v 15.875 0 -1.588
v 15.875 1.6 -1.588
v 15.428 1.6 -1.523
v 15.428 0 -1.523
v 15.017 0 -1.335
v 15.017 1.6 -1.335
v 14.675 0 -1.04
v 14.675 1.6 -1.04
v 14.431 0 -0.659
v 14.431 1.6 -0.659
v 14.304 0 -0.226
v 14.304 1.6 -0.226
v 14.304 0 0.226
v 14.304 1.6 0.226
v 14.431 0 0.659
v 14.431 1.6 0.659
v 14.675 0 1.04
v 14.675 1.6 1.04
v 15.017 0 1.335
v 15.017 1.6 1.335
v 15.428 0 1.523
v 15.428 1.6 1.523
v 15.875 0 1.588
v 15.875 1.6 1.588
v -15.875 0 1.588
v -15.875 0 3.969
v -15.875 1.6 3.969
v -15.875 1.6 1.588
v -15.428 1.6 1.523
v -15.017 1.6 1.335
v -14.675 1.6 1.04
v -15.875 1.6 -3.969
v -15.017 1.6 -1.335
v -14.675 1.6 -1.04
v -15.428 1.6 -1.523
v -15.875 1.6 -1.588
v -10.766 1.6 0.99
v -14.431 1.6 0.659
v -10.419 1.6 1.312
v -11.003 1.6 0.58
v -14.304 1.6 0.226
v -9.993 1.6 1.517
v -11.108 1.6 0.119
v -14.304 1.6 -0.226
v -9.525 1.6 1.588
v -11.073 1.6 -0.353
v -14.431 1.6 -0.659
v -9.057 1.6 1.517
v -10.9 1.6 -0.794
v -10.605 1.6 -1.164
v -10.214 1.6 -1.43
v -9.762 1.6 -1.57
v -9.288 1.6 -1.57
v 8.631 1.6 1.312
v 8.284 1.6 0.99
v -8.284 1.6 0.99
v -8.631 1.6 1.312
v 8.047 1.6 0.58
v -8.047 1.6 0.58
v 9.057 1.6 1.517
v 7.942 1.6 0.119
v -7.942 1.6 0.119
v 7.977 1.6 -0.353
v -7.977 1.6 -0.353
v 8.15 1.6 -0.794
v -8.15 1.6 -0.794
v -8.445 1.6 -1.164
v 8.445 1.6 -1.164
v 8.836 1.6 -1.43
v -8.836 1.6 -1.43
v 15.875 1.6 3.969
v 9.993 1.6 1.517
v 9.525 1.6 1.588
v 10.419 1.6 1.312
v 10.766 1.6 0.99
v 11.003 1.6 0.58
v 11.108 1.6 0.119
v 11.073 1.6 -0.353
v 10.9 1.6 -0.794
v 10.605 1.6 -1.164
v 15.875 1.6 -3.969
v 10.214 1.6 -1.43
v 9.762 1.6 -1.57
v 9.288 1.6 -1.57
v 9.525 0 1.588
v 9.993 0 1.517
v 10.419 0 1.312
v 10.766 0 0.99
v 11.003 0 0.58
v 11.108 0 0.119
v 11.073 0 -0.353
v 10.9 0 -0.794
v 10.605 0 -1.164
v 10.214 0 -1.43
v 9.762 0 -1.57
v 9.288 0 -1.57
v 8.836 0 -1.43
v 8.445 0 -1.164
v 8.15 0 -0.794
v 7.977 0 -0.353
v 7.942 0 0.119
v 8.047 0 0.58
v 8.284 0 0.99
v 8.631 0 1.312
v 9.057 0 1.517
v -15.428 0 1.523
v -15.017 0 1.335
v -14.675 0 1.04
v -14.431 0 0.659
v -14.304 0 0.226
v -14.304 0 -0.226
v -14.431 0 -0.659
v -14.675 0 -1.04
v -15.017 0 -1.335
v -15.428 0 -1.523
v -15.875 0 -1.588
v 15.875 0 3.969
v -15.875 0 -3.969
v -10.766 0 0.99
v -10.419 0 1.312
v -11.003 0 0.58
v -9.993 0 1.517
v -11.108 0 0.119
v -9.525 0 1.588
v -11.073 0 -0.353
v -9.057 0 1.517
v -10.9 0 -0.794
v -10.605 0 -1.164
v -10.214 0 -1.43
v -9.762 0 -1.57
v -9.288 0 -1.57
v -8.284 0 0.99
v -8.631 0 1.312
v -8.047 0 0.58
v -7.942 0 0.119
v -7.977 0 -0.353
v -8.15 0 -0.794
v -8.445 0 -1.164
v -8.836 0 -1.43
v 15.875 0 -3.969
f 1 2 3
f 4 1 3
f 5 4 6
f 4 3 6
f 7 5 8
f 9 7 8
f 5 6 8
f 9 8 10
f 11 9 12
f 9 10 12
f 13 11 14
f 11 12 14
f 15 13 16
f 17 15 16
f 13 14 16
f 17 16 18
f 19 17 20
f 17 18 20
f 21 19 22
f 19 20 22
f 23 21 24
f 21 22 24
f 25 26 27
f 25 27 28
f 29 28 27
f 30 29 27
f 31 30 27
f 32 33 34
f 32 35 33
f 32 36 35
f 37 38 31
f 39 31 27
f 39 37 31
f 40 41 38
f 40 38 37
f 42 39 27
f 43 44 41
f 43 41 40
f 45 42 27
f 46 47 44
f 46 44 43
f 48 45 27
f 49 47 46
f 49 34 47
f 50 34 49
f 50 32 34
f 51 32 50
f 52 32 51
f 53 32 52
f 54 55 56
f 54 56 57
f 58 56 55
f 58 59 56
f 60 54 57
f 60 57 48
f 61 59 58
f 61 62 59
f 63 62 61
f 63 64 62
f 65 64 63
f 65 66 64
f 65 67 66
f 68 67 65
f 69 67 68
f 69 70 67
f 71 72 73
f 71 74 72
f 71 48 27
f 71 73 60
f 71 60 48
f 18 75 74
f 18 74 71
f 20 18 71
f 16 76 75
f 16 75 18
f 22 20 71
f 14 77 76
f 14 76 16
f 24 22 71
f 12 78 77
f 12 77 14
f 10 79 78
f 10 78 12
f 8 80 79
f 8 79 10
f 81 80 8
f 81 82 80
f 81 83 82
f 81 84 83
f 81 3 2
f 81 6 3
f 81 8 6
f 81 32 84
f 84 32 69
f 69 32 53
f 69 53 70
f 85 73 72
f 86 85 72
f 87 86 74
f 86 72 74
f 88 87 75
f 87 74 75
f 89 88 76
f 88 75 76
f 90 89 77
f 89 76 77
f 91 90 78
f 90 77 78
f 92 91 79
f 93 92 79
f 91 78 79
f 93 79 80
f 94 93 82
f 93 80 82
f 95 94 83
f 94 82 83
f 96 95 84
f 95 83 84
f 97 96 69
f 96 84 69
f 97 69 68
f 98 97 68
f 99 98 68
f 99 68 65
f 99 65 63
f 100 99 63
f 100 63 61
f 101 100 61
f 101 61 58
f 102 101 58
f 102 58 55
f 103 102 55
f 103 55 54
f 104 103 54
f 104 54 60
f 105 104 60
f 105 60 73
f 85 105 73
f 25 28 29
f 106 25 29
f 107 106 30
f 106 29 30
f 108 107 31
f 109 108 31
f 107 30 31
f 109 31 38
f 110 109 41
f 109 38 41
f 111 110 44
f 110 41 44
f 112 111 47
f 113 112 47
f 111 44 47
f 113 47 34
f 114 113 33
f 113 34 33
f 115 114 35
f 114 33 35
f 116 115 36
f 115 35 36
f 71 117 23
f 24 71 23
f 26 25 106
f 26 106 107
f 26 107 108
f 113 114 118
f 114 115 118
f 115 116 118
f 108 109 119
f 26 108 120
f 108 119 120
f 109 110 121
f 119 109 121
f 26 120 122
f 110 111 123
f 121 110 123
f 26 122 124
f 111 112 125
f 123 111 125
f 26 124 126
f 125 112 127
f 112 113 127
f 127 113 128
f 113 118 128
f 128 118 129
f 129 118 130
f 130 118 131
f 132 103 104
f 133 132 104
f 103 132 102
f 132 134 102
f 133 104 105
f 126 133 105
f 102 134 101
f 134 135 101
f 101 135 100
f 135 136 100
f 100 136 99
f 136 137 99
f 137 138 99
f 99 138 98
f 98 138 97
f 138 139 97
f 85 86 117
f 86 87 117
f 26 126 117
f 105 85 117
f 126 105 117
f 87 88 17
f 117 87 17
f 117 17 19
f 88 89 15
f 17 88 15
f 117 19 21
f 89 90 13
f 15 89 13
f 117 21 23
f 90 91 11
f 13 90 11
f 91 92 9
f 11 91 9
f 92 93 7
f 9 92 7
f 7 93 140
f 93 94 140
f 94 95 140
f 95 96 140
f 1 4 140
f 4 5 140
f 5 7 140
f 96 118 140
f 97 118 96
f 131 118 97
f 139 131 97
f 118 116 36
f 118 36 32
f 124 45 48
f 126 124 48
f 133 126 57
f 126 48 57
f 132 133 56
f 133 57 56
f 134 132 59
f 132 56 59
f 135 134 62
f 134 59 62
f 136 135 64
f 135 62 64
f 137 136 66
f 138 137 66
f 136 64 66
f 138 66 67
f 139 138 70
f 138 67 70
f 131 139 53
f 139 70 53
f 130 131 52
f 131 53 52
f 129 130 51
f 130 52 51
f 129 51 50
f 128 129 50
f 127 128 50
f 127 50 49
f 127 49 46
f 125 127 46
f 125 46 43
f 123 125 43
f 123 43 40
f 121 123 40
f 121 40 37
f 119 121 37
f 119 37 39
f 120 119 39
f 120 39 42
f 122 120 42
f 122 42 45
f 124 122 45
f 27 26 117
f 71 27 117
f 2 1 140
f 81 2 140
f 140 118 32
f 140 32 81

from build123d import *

# Parameters (mm, degrees)
SKETCH1_W           = 31.75
SKETCH1_H           = 7.9375
BOSS_EXTRUDE1_DEPTH = 1.6
SKETCH2_R           = 1.5875
CUT_EXTRUDE1_DEPTH  = 17.441611891


with BuildPart() as part:
    # Sketch1 → Boss-Extrude1 (new body)
    with BuildSketch(Plane(origin=(0, 0, 0), x_dir=(1, 0, 0), z_dir=(0, 1, 0))):
        Rectangle(SKETCH1_W, SKETCH1_H)
    extrude(amount=BOSS_EXTRUDE1_DEPTH)

    # Sketch2 → Cut-Extrude1 (cut, through all)
    with BuildSketch(Plane(origin=(0, 1.6, 0), x_dir=(1, 0, 0), z_dir=(0, 1, 0))):
        with Locations(Location((-9.525, 0, 0), (0, 0, 270))):
            Circle(SKETCH2_R)
        with Locations(Location((9.525, 0, 0), (0, 0, 270))):
            Circle(SKETCH2_R)
        with BuildLine():
            Line((-15.875, 1.5875), (-15.875, -1.5875))
            ThreePointArc((-15.875, -1.5875), (-14.2875, 0), (-15.875, 1.5875))
        make_face()
        with BuildLine():
            Line((15.875, -1.5875), (15.875, 1.5875))
            ThreePointArc((15.875, 1.5875), (14.2875, 0), (15.875, -1.5875))
        make_face()
    extrude(amount=-CUT_EXTRUDE1_DEPTH, mode=Mode.SUBTRACT)


solid = part.part
